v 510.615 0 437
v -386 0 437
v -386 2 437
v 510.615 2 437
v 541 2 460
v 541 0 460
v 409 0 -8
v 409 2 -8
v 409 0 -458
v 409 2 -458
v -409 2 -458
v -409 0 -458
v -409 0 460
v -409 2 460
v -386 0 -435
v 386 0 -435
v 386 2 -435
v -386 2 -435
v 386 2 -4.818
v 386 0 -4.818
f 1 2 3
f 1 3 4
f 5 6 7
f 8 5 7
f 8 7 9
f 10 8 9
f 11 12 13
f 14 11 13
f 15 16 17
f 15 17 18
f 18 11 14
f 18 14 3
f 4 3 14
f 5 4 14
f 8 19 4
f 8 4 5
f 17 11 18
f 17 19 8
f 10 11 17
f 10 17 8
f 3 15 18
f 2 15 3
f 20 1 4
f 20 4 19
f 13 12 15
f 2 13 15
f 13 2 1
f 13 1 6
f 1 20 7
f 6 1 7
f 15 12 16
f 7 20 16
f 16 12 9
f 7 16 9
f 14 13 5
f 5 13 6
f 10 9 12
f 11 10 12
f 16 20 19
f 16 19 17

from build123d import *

# Parameters (mm, degrees)
EXTRUDE_1_DEPTH = 2


with BuildPart() as part:
    # 草图1 → 凸台-拉伸1 (new body)
    with BuildSketch(Plane(origin=(0, 0, 0), x_dir=(1, 0, 0), z_dir=(0, 1, 0))):
        Polygon((-409, 458), (-409, -460), (541, -460), (409, 8), (409, 458), align=None)
        Polygon((386, 435), (-386, 435), (-386, -437), (510.615467151, -437), (386, 4.818474445), align=None, mode=Mode.SUBTRACT)
    extrude(amount=EXTRUDE_1_DEPTH)


solid = part.part
